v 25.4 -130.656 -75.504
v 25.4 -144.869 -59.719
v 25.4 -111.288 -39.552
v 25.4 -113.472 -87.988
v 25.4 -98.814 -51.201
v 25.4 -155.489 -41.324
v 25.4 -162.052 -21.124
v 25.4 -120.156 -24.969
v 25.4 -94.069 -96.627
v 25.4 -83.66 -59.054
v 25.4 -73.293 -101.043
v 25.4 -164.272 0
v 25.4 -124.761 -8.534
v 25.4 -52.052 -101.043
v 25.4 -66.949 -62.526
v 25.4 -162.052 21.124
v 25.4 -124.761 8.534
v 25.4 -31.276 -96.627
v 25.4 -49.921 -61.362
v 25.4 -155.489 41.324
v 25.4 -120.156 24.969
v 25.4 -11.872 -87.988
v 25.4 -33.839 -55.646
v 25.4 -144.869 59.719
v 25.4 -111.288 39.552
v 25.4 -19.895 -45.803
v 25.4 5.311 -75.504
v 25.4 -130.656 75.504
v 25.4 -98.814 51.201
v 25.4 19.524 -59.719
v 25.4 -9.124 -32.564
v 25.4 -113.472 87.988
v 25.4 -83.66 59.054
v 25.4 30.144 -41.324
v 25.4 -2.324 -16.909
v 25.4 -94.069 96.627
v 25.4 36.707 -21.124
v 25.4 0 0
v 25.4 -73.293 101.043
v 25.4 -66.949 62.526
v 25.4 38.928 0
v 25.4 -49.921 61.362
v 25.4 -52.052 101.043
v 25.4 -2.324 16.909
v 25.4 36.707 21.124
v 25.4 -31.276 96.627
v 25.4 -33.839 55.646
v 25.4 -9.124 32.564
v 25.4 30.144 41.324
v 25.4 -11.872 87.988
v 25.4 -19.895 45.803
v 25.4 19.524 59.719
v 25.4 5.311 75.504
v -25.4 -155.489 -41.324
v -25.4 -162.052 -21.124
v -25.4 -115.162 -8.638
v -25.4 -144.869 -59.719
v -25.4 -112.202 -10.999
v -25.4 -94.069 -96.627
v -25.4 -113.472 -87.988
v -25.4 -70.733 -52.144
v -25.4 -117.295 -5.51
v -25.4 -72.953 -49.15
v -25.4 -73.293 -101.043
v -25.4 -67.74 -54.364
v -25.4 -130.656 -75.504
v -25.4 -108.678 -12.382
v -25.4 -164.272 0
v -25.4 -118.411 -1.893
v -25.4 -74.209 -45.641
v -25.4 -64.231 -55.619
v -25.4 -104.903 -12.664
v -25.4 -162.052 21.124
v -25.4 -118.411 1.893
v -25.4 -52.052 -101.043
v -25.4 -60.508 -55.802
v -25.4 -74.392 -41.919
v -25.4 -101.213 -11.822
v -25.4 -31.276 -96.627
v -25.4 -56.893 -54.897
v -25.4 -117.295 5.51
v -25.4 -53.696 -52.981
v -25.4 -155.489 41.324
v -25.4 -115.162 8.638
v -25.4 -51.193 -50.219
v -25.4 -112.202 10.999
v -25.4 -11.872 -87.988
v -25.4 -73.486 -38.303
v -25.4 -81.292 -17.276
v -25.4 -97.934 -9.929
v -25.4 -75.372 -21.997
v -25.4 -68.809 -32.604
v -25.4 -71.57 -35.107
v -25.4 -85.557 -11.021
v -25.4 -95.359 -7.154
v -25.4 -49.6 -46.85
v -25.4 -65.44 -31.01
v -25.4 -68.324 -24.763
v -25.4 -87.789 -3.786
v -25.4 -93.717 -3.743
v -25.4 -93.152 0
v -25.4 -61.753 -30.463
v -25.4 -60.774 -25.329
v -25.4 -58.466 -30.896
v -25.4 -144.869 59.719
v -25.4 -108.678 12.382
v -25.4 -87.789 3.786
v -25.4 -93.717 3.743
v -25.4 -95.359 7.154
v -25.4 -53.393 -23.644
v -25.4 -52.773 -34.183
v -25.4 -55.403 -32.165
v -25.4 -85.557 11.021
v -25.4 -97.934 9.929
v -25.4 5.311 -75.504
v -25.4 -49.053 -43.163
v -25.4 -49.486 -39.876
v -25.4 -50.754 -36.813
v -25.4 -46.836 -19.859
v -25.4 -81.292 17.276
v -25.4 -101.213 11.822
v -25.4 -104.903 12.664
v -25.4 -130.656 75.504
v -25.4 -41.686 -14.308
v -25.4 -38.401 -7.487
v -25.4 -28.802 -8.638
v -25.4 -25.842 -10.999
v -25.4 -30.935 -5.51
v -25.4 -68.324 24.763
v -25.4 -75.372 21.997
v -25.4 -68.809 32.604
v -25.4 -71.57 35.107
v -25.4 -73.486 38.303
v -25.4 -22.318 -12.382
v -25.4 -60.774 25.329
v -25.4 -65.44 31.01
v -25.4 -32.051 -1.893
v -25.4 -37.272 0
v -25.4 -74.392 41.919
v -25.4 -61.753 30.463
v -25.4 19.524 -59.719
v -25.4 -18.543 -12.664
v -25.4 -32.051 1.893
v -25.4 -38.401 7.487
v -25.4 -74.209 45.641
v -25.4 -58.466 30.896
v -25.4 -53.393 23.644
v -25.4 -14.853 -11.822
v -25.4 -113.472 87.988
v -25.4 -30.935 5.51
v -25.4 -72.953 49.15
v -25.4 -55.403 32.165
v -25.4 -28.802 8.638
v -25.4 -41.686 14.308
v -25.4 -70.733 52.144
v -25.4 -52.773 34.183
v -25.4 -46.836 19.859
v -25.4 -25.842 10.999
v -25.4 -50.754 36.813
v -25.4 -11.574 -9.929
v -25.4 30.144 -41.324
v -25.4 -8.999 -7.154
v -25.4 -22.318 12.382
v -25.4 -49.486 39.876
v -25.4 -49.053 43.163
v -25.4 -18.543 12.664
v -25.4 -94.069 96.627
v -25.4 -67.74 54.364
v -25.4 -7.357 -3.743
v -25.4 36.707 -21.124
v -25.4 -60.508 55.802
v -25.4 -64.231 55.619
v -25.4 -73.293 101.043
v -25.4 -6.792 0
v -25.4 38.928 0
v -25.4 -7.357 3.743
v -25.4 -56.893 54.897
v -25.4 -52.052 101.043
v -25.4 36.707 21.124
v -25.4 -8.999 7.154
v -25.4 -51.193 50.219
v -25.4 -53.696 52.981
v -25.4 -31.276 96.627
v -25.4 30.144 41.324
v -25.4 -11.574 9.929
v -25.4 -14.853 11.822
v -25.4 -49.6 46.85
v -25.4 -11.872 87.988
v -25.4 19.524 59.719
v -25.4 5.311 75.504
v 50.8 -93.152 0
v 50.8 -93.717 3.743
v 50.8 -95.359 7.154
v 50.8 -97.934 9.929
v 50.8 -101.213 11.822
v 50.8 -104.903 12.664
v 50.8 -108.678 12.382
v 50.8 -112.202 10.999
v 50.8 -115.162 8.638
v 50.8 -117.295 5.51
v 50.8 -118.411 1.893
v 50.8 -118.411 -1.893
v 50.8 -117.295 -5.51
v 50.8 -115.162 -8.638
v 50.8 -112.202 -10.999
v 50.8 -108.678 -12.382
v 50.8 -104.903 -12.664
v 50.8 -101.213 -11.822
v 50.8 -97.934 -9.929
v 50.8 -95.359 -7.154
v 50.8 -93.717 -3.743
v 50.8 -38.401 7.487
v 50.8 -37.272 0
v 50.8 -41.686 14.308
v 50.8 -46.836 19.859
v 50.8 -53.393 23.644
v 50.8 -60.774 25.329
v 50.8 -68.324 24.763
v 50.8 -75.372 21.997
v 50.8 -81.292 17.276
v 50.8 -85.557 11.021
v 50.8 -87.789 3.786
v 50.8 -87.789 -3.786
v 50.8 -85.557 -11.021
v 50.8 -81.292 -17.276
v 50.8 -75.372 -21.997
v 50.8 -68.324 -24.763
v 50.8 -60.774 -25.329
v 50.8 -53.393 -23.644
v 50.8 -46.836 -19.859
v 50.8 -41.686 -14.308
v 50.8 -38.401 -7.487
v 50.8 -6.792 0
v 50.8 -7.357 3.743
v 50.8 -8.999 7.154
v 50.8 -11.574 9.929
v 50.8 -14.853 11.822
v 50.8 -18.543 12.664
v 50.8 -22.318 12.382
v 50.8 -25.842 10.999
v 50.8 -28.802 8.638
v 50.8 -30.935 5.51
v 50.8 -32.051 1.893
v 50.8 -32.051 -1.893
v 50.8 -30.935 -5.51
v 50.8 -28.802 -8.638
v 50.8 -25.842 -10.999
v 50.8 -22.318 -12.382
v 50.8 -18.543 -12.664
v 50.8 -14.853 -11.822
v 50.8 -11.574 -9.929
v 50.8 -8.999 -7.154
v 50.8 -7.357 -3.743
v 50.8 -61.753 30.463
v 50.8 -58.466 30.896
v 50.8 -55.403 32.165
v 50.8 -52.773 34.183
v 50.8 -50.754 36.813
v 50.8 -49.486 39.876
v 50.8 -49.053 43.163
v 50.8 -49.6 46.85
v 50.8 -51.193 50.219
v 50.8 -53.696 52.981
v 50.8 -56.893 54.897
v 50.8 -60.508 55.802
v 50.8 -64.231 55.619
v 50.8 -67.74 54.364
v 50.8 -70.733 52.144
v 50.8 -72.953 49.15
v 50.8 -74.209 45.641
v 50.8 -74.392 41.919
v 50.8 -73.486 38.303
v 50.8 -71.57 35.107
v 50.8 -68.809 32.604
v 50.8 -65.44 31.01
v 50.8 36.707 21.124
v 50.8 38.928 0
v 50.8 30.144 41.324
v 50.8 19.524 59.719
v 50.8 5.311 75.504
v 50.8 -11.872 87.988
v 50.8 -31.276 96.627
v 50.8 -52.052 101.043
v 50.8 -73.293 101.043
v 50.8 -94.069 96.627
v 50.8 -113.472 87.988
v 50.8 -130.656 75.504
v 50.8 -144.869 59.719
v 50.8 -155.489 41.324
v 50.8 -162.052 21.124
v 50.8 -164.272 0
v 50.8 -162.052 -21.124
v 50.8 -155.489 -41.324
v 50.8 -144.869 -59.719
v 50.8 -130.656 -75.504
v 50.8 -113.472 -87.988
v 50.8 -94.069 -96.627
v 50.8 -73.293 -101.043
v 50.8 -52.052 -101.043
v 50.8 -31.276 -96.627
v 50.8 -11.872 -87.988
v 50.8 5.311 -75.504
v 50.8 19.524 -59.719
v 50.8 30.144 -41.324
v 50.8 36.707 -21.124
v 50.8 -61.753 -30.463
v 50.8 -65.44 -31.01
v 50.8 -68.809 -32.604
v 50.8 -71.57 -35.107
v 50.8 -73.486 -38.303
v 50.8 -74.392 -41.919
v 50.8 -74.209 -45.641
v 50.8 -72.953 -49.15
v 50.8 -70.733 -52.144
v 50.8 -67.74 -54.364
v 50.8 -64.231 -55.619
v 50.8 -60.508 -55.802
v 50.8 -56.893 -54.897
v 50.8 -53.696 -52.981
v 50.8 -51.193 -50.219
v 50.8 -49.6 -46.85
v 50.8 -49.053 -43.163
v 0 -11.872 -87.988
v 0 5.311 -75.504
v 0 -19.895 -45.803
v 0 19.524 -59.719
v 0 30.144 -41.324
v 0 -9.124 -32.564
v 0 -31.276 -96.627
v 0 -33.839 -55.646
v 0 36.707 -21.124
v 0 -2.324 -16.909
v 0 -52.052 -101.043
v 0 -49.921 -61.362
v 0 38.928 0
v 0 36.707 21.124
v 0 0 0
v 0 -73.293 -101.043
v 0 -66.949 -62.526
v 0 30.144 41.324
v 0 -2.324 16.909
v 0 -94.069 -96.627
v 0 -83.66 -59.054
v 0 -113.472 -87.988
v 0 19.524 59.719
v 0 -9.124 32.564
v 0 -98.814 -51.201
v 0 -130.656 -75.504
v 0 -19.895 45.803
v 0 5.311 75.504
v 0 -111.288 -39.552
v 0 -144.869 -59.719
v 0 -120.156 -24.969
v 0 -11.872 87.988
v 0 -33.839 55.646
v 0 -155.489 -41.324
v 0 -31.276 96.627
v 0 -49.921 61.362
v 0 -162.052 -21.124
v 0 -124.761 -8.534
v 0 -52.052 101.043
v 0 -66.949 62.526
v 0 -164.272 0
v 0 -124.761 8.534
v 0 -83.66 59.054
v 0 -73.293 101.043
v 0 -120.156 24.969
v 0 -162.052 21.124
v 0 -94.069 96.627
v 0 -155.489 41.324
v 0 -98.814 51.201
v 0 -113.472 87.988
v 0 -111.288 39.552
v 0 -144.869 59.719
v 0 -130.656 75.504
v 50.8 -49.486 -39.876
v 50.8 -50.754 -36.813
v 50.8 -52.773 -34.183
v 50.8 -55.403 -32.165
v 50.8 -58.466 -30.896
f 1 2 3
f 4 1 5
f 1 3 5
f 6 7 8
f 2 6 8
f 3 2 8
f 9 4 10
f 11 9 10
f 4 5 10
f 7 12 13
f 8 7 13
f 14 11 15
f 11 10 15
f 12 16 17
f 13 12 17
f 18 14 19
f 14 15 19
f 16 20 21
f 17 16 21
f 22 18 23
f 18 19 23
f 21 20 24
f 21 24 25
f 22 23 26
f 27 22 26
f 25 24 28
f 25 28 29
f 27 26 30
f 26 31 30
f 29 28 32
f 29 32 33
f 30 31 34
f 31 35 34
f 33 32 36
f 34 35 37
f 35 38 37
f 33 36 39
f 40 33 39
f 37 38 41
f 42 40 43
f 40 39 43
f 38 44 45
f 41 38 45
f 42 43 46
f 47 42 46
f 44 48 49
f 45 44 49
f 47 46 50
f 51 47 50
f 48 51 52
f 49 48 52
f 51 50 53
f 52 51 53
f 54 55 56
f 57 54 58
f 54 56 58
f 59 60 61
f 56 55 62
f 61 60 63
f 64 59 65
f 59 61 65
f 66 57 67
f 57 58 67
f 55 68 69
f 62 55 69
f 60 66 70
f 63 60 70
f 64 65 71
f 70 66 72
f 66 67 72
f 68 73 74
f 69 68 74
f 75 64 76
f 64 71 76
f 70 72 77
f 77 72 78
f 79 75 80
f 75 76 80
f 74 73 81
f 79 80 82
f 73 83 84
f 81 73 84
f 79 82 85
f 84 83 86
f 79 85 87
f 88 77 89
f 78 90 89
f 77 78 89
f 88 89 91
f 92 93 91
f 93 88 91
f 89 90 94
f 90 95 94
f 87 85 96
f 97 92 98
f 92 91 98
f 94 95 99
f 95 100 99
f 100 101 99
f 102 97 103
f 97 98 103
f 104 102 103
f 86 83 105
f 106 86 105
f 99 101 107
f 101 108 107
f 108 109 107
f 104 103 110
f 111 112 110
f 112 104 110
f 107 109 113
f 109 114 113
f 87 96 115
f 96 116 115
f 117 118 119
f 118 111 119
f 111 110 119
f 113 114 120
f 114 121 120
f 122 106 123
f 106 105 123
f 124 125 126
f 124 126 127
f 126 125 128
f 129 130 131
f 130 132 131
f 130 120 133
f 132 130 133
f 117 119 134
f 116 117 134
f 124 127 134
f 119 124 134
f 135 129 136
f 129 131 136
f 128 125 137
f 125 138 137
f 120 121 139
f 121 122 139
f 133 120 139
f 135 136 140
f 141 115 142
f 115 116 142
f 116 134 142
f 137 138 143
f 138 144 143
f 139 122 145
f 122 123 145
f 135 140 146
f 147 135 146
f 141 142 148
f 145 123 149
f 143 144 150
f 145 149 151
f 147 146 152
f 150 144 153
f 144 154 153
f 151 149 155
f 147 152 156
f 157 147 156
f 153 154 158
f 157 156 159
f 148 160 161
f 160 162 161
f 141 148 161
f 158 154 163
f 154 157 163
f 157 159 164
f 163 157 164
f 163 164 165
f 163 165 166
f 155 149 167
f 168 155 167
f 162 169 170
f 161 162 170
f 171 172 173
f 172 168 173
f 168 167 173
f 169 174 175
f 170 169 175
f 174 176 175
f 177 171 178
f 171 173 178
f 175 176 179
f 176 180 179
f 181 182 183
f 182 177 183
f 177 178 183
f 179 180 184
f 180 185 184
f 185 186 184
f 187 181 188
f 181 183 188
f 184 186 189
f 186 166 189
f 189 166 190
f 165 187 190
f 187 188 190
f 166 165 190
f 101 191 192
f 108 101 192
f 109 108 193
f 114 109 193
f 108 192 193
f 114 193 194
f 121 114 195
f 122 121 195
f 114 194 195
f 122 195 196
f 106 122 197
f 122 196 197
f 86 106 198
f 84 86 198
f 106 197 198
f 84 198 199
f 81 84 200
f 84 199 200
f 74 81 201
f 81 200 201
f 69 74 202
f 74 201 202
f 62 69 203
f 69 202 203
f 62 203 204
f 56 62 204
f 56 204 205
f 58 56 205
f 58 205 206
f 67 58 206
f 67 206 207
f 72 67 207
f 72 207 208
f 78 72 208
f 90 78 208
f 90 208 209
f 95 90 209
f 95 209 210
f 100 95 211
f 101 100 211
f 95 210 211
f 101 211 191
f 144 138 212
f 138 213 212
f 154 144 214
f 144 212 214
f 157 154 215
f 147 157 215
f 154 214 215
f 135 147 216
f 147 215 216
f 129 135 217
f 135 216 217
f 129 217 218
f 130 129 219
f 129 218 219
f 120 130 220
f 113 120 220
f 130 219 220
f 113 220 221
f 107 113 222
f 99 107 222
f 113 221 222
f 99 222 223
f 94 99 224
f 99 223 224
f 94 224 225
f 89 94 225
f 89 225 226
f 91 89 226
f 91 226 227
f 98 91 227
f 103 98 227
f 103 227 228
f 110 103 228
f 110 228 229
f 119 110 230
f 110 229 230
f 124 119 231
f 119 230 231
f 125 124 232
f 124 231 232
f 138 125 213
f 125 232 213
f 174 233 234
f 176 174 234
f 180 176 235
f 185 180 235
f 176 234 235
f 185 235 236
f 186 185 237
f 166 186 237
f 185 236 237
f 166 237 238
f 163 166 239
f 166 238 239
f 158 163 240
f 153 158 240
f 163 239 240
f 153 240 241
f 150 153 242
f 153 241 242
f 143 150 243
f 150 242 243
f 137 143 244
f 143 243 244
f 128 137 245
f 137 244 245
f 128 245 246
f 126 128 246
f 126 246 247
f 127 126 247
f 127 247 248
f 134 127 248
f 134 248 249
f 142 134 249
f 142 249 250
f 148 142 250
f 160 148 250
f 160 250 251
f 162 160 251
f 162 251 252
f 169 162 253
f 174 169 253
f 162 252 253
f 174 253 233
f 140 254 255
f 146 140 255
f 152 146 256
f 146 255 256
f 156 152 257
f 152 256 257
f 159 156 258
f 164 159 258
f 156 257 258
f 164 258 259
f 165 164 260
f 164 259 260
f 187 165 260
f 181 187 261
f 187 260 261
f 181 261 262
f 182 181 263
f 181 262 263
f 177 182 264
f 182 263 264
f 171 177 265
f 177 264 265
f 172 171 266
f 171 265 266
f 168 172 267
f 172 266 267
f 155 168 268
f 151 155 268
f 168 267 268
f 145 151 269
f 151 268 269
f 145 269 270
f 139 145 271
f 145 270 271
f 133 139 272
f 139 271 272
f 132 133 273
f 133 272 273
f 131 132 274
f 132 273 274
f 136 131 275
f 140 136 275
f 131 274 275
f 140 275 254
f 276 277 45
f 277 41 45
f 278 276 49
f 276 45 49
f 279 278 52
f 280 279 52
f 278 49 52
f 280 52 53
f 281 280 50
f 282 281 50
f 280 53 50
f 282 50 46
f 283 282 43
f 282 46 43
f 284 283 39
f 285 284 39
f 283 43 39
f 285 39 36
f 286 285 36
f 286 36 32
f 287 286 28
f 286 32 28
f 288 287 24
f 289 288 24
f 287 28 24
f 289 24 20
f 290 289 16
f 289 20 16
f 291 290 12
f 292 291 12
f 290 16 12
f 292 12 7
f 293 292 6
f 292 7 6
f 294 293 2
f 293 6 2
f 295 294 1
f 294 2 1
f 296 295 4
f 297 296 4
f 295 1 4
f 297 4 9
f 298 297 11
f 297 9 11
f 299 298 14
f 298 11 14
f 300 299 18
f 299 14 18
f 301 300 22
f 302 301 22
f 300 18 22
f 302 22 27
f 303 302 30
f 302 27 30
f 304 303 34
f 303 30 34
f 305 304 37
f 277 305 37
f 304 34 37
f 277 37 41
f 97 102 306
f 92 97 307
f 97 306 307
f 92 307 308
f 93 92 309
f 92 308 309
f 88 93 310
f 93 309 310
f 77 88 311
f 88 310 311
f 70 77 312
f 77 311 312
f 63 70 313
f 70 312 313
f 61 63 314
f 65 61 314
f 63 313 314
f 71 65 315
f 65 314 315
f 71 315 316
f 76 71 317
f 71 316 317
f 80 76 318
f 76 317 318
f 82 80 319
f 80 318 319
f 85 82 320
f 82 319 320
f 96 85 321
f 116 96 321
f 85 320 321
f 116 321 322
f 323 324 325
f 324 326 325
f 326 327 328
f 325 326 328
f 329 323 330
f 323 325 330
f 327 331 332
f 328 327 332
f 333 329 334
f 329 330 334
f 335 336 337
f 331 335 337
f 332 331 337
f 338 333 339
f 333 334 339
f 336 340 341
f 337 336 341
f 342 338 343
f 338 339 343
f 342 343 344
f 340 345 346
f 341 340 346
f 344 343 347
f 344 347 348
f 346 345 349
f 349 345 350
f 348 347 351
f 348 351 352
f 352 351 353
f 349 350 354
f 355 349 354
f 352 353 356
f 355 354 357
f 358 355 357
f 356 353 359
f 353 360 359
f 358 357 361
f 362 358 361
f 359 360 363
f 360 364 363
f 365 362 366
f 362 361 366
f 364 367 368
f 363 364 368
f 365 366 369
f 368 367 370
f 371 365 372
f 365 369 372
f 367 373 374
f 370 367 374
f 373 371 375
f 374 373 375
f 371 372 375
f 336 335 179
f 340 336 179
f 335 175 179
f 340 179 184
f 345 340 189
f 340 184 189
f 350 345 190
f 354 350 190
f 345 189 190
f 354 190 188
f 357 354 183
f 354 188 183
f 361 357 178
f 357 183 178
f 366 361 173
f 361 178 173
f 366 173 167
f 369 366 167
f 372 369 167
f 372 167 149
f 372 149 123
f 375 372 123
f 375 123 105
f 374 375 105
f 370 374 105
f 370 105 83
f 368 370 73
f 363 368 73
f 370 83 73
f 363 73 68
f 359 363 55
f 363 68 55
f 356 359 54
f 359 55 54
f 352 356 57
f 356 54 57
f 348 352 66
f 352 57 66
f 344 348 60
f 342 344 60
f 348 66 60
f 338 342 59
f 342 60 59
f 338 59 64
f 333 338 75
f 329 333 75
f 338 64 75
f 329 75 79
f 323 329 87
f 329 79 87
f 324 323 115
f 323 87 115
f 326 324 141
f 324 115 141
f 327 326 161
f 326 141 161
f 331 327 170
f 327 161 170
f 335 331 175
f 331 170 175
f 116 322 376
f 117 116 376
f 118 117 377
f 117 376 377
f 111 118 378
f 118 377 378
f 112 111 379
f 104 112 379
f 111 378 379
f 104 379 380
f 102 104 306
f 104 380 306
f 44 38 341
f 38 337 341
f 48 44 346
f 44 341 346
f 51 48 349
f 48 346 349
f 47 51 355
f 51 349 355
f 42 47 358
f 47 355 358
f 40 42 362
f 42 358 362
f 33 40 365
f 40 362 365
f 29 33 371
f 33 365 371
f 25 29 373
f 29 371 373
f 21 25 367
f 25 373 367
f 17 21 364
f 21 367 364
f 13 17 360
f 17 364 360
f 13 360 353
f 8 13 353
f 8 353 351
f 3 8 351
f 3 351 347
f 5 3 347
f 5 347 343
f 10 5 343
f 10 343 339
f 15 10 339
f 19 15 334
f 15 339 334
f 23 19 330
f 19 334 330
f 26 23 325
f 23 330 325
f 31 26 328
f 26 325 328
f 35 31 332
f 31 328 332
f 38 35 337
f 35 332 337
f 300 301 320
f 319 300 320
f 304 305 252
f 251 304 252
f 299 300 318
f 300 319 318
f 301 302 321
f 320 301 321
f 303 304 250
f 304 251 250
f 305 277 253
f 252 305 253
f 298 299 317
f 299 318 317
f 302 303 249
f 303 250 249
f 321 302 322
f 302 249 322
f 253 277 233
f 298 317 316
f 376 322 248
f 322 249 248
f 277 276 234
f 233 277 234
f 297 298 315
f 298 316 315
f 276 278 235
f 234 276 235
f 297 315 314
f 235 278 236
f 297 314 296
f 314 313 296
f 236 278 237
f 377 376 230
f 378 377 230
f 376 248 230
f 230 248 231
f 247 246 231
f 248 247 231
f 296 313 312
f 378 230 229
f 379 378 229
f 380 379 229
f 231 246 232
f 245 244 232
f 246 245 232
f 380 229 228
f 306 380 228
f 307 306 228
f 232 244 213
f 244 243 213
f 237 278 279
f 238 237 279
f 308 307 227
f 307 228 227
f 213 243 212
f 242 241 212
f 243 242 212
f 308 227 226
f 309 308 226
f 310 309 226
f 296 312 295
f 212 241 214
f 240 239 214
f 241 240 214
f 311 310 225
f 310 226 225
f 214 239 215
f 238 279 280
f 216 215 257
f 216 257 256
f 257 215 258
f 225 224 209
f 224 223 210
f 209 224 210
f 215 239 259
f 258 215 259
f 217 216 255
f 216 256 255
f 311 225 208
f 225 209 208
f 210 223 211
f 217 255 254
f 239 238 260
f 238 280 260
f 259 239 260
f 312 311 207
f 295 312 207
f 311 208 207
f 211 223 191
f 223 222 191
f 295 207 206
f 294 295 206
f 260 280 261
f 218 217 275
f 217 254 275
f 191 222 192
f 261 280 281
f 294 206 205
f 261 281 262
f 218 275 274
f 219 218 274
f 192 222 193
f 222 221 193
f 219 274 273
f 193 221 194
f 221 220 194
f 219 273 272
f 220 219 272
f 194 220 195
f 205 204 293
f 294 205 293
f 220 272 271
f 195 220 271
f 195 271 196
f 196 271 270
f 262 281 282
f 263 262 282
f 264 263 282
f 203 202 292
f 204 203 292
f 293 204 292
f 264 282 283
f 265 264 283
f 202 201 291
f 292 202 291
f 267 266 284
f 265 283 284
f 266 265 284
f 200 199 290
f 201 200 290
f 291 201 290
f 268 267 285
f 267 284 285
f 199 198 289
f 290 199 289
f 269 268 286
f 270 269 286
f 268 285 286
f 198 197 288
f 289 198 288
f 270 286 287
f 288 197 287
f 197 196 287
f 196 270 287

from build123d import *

# Parameters (mm, degrees)
F2_R     = 12.7
F3_DEPTH = 76.2


with BuildPart() as f1:
    # F0 (on Top) → F1 (revolve)
    with BuildSketch(Plane.XY):
        Polygon((0, 38.927556), (-25.4, 38.927556), (-25.4, -37.272444), (50.8, -37.272444), (50.8, 38.927556), (25.4, 38.927556), (25.4, 0), (0, 0), align=None)
    revolve(axis=Axis((12.7, -62.672444, 0), (1, 0, 0)))

    # F2 (on face) → F3 (cut, through all)
    with BuildSketch(Plane.YZ.offset(50.8)):
        with BuildLine():
            ThreePointArc((-32.192444, 0), (-19.492444, -12.7), (-6.792444, 0))
            ThreePointArc((-6.792444, 0), (-19.492444, 12.7), (-32.192444, 0))
        make_face()
        with BuildLine():
            ThreePointArc((-61.752998, -30.463353), (-70.733254, -52.143609), (-49.052998, -43.163353))
            ThreePointArc((-49.052998, -43.163353), (-52.772742, -34.183097), (-61.752998, -30.463353))
        make_face()
        with Locations((-105.852444, 0)):
            Circle(F2_R)
        with BuildLine():
            ThreePointArc((-61.752998, 30.463353), (-52.772742, 34.183097), (-49.052998, 43.163353))
            ThreePointArc((-49.052998, 43.163353), (-70.733254, 52.143609), (-61.752998, 30.463353))
        make_face()
    extrude(amount=-F3_DEPTH, mode=Mode.SUBTRACT)


solid = f1.part
